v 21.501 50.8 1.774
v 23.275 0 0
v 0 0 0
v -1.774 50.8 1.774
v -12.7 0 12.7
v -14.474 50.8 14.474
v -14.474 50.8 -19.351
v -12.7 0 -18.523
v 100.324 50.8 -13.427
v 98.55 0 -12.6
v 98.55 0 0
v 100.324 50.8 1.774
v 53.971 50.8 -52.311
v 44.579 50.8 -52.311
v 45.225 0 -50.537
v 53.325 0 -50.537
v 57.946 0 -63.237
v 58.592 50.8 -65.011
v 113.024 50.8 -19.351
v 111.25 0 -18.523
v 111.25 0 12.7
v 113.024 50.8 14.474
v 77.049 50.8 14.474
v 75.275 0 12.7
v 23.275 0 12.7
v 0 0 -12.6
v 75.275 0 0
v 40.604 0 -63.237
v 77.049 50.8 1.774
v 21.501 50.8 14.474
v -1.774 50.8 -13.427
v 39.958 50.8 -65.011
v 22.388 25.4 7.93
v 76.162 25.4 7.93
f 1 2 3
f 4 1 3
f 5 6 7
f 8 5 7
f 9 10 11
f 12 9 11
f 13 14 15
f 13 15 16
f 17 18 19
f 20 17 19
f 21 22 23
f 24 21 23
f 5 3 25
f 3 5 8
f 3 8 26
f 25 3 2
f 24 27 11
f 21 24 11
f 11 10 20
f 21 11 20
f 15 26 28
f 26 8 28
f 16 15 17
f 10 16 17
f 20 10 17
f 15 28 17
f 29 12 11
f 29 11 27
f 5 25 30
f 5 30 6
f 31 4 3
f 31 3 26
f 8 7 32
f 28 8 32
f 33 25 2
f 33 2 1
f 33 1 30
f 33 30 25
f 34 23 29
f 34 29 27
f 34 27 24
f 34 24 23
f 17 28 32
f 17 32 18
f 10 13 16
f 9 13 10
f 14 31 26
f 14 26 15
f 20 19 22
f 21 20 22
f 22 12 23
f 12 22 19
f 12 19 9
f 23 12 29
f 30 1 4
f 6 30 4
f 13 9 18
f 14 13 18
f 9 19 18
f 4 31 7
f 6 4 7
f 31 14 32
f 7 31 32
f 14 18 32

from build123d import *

# Parameters (mm, degrees)
SALIENTE_EXTRUIR1_DEPTH = 8
SALIENTE_EXTRUIR1_TAPER = -2
SALIENTE_EXTRUIR3_DEPTH = 75
SALIENTE_EXTRUIR3_TAPER = -2
CORTAR_EXTRUIR3_DEPTH   = 76.0000001
CORTAR_EXTRUIR3_TAPER   = -2
CROQUIS14_W             = 52
CROQUIS14_H             = 12.7
CORTAR_EXTRUIR4_DEPTH   = 76.0000001
CORTAR_EXTRUIR4_TAPER   = -2
CORTAR_EXTRUIR5_DEPTH   = 24.2
CORTAR_EXTRUIR5_TAPER   = -2


with BuildPart() as part:
    # Croquis1 → Saliente-Extruir1 (new body)
    with BuildSketch(Plane(origin=(0, 0, 0), x_dir=(1, 0, 0), z_dir=(0, 1, 0))):
        Polygon((0, 0), (98.55, 0), (98.55, 12.6), (53.325, 50.537320346), (45.225, 50.537320346), (0, 12.6), align=None)
    extrude(amount=SALIENTE_EXTRUIR1_DEPTH, taper=SALIENTE_EXTRUIR1_TAPER)

    # Croquis10 → Saliente-Extruir3 (add)
    with BuildSketch(Plane.XZ):
        Polygon((-12.7, 12.7), (-12.7, -18.52320689), (40.60360085, -63.237320346), (57.94639915, -63.237320346), (111.25, -18.52320689), (111.25, 12.7), align=None)
    extrude(amount=-SALIENTE_EXTRUIR3_DEPTH, taper=SALIENTE_EXTRUIR3_TAPER)

    # Croquis11 → Cortar-Extruir3 (cut, through all)
    with BuildSketch(Plane.XZ):
        Polygon((98.55, 0), (0, 0), (0, -12.6), (45.225, -50.537320346), (53.325, -50.537320346), (98.55, -12.6), align=None)
    extrude(amount=-CORTAR_EXTRUIR3_DEPTH, taper=CORTAR_EXTRUIR3_TAPER, mode=Mode.SUBTRACT)

    # Croquis14 → Cortar-Extruir4 (cut, through all)
    with BuildSketch(Plane.XZ):
        with Locations((49.275, 6.35)):
            Rectangle(CROQUIS14_W, CROQUIS14_H)
    extrude(amount=-CORTAR_EXTRUIR4_DEPTH, taper=CORTAR_EXTRUIR4_TAPER, mode=Mode.SUBTRACT)

    # Croquis16 → Cortar-Extruir5 (cut)
    with BuildSketch(Plane(origin=(0, 75, 0), x_dir=(1, 0, 0), z_dir=(0, 1, 0))):
        Polygon((101.169057712, -2.619057712), (77.894057712, -2.619057712), (77.894057712, -15.319057712), (113.869057712, -15.319057712), (113.869057712, 19.74472033), (58.899447267, 65.856378057), (39.650552733, 65.856378057), (-15.319057712, 19.74472033), (-15.319057712, -15.319057712), (20.655942288, -15.319057712), (20.655942288, -2.619057712), (-2.619057712, -2.619057712), (-2.619057712, 13.82151344), (44.271951883, 53.156378057), (54.278048117, 53.156378057), (101.169057712, 13.82151344), align=None)
    extrude(amount=-CORTAR_EXTRUIR5_DEPTH, taper=CORTAR_EXTRUIR5_TAPER, mode=Mode.SUBTRACT)


solid = part.part
